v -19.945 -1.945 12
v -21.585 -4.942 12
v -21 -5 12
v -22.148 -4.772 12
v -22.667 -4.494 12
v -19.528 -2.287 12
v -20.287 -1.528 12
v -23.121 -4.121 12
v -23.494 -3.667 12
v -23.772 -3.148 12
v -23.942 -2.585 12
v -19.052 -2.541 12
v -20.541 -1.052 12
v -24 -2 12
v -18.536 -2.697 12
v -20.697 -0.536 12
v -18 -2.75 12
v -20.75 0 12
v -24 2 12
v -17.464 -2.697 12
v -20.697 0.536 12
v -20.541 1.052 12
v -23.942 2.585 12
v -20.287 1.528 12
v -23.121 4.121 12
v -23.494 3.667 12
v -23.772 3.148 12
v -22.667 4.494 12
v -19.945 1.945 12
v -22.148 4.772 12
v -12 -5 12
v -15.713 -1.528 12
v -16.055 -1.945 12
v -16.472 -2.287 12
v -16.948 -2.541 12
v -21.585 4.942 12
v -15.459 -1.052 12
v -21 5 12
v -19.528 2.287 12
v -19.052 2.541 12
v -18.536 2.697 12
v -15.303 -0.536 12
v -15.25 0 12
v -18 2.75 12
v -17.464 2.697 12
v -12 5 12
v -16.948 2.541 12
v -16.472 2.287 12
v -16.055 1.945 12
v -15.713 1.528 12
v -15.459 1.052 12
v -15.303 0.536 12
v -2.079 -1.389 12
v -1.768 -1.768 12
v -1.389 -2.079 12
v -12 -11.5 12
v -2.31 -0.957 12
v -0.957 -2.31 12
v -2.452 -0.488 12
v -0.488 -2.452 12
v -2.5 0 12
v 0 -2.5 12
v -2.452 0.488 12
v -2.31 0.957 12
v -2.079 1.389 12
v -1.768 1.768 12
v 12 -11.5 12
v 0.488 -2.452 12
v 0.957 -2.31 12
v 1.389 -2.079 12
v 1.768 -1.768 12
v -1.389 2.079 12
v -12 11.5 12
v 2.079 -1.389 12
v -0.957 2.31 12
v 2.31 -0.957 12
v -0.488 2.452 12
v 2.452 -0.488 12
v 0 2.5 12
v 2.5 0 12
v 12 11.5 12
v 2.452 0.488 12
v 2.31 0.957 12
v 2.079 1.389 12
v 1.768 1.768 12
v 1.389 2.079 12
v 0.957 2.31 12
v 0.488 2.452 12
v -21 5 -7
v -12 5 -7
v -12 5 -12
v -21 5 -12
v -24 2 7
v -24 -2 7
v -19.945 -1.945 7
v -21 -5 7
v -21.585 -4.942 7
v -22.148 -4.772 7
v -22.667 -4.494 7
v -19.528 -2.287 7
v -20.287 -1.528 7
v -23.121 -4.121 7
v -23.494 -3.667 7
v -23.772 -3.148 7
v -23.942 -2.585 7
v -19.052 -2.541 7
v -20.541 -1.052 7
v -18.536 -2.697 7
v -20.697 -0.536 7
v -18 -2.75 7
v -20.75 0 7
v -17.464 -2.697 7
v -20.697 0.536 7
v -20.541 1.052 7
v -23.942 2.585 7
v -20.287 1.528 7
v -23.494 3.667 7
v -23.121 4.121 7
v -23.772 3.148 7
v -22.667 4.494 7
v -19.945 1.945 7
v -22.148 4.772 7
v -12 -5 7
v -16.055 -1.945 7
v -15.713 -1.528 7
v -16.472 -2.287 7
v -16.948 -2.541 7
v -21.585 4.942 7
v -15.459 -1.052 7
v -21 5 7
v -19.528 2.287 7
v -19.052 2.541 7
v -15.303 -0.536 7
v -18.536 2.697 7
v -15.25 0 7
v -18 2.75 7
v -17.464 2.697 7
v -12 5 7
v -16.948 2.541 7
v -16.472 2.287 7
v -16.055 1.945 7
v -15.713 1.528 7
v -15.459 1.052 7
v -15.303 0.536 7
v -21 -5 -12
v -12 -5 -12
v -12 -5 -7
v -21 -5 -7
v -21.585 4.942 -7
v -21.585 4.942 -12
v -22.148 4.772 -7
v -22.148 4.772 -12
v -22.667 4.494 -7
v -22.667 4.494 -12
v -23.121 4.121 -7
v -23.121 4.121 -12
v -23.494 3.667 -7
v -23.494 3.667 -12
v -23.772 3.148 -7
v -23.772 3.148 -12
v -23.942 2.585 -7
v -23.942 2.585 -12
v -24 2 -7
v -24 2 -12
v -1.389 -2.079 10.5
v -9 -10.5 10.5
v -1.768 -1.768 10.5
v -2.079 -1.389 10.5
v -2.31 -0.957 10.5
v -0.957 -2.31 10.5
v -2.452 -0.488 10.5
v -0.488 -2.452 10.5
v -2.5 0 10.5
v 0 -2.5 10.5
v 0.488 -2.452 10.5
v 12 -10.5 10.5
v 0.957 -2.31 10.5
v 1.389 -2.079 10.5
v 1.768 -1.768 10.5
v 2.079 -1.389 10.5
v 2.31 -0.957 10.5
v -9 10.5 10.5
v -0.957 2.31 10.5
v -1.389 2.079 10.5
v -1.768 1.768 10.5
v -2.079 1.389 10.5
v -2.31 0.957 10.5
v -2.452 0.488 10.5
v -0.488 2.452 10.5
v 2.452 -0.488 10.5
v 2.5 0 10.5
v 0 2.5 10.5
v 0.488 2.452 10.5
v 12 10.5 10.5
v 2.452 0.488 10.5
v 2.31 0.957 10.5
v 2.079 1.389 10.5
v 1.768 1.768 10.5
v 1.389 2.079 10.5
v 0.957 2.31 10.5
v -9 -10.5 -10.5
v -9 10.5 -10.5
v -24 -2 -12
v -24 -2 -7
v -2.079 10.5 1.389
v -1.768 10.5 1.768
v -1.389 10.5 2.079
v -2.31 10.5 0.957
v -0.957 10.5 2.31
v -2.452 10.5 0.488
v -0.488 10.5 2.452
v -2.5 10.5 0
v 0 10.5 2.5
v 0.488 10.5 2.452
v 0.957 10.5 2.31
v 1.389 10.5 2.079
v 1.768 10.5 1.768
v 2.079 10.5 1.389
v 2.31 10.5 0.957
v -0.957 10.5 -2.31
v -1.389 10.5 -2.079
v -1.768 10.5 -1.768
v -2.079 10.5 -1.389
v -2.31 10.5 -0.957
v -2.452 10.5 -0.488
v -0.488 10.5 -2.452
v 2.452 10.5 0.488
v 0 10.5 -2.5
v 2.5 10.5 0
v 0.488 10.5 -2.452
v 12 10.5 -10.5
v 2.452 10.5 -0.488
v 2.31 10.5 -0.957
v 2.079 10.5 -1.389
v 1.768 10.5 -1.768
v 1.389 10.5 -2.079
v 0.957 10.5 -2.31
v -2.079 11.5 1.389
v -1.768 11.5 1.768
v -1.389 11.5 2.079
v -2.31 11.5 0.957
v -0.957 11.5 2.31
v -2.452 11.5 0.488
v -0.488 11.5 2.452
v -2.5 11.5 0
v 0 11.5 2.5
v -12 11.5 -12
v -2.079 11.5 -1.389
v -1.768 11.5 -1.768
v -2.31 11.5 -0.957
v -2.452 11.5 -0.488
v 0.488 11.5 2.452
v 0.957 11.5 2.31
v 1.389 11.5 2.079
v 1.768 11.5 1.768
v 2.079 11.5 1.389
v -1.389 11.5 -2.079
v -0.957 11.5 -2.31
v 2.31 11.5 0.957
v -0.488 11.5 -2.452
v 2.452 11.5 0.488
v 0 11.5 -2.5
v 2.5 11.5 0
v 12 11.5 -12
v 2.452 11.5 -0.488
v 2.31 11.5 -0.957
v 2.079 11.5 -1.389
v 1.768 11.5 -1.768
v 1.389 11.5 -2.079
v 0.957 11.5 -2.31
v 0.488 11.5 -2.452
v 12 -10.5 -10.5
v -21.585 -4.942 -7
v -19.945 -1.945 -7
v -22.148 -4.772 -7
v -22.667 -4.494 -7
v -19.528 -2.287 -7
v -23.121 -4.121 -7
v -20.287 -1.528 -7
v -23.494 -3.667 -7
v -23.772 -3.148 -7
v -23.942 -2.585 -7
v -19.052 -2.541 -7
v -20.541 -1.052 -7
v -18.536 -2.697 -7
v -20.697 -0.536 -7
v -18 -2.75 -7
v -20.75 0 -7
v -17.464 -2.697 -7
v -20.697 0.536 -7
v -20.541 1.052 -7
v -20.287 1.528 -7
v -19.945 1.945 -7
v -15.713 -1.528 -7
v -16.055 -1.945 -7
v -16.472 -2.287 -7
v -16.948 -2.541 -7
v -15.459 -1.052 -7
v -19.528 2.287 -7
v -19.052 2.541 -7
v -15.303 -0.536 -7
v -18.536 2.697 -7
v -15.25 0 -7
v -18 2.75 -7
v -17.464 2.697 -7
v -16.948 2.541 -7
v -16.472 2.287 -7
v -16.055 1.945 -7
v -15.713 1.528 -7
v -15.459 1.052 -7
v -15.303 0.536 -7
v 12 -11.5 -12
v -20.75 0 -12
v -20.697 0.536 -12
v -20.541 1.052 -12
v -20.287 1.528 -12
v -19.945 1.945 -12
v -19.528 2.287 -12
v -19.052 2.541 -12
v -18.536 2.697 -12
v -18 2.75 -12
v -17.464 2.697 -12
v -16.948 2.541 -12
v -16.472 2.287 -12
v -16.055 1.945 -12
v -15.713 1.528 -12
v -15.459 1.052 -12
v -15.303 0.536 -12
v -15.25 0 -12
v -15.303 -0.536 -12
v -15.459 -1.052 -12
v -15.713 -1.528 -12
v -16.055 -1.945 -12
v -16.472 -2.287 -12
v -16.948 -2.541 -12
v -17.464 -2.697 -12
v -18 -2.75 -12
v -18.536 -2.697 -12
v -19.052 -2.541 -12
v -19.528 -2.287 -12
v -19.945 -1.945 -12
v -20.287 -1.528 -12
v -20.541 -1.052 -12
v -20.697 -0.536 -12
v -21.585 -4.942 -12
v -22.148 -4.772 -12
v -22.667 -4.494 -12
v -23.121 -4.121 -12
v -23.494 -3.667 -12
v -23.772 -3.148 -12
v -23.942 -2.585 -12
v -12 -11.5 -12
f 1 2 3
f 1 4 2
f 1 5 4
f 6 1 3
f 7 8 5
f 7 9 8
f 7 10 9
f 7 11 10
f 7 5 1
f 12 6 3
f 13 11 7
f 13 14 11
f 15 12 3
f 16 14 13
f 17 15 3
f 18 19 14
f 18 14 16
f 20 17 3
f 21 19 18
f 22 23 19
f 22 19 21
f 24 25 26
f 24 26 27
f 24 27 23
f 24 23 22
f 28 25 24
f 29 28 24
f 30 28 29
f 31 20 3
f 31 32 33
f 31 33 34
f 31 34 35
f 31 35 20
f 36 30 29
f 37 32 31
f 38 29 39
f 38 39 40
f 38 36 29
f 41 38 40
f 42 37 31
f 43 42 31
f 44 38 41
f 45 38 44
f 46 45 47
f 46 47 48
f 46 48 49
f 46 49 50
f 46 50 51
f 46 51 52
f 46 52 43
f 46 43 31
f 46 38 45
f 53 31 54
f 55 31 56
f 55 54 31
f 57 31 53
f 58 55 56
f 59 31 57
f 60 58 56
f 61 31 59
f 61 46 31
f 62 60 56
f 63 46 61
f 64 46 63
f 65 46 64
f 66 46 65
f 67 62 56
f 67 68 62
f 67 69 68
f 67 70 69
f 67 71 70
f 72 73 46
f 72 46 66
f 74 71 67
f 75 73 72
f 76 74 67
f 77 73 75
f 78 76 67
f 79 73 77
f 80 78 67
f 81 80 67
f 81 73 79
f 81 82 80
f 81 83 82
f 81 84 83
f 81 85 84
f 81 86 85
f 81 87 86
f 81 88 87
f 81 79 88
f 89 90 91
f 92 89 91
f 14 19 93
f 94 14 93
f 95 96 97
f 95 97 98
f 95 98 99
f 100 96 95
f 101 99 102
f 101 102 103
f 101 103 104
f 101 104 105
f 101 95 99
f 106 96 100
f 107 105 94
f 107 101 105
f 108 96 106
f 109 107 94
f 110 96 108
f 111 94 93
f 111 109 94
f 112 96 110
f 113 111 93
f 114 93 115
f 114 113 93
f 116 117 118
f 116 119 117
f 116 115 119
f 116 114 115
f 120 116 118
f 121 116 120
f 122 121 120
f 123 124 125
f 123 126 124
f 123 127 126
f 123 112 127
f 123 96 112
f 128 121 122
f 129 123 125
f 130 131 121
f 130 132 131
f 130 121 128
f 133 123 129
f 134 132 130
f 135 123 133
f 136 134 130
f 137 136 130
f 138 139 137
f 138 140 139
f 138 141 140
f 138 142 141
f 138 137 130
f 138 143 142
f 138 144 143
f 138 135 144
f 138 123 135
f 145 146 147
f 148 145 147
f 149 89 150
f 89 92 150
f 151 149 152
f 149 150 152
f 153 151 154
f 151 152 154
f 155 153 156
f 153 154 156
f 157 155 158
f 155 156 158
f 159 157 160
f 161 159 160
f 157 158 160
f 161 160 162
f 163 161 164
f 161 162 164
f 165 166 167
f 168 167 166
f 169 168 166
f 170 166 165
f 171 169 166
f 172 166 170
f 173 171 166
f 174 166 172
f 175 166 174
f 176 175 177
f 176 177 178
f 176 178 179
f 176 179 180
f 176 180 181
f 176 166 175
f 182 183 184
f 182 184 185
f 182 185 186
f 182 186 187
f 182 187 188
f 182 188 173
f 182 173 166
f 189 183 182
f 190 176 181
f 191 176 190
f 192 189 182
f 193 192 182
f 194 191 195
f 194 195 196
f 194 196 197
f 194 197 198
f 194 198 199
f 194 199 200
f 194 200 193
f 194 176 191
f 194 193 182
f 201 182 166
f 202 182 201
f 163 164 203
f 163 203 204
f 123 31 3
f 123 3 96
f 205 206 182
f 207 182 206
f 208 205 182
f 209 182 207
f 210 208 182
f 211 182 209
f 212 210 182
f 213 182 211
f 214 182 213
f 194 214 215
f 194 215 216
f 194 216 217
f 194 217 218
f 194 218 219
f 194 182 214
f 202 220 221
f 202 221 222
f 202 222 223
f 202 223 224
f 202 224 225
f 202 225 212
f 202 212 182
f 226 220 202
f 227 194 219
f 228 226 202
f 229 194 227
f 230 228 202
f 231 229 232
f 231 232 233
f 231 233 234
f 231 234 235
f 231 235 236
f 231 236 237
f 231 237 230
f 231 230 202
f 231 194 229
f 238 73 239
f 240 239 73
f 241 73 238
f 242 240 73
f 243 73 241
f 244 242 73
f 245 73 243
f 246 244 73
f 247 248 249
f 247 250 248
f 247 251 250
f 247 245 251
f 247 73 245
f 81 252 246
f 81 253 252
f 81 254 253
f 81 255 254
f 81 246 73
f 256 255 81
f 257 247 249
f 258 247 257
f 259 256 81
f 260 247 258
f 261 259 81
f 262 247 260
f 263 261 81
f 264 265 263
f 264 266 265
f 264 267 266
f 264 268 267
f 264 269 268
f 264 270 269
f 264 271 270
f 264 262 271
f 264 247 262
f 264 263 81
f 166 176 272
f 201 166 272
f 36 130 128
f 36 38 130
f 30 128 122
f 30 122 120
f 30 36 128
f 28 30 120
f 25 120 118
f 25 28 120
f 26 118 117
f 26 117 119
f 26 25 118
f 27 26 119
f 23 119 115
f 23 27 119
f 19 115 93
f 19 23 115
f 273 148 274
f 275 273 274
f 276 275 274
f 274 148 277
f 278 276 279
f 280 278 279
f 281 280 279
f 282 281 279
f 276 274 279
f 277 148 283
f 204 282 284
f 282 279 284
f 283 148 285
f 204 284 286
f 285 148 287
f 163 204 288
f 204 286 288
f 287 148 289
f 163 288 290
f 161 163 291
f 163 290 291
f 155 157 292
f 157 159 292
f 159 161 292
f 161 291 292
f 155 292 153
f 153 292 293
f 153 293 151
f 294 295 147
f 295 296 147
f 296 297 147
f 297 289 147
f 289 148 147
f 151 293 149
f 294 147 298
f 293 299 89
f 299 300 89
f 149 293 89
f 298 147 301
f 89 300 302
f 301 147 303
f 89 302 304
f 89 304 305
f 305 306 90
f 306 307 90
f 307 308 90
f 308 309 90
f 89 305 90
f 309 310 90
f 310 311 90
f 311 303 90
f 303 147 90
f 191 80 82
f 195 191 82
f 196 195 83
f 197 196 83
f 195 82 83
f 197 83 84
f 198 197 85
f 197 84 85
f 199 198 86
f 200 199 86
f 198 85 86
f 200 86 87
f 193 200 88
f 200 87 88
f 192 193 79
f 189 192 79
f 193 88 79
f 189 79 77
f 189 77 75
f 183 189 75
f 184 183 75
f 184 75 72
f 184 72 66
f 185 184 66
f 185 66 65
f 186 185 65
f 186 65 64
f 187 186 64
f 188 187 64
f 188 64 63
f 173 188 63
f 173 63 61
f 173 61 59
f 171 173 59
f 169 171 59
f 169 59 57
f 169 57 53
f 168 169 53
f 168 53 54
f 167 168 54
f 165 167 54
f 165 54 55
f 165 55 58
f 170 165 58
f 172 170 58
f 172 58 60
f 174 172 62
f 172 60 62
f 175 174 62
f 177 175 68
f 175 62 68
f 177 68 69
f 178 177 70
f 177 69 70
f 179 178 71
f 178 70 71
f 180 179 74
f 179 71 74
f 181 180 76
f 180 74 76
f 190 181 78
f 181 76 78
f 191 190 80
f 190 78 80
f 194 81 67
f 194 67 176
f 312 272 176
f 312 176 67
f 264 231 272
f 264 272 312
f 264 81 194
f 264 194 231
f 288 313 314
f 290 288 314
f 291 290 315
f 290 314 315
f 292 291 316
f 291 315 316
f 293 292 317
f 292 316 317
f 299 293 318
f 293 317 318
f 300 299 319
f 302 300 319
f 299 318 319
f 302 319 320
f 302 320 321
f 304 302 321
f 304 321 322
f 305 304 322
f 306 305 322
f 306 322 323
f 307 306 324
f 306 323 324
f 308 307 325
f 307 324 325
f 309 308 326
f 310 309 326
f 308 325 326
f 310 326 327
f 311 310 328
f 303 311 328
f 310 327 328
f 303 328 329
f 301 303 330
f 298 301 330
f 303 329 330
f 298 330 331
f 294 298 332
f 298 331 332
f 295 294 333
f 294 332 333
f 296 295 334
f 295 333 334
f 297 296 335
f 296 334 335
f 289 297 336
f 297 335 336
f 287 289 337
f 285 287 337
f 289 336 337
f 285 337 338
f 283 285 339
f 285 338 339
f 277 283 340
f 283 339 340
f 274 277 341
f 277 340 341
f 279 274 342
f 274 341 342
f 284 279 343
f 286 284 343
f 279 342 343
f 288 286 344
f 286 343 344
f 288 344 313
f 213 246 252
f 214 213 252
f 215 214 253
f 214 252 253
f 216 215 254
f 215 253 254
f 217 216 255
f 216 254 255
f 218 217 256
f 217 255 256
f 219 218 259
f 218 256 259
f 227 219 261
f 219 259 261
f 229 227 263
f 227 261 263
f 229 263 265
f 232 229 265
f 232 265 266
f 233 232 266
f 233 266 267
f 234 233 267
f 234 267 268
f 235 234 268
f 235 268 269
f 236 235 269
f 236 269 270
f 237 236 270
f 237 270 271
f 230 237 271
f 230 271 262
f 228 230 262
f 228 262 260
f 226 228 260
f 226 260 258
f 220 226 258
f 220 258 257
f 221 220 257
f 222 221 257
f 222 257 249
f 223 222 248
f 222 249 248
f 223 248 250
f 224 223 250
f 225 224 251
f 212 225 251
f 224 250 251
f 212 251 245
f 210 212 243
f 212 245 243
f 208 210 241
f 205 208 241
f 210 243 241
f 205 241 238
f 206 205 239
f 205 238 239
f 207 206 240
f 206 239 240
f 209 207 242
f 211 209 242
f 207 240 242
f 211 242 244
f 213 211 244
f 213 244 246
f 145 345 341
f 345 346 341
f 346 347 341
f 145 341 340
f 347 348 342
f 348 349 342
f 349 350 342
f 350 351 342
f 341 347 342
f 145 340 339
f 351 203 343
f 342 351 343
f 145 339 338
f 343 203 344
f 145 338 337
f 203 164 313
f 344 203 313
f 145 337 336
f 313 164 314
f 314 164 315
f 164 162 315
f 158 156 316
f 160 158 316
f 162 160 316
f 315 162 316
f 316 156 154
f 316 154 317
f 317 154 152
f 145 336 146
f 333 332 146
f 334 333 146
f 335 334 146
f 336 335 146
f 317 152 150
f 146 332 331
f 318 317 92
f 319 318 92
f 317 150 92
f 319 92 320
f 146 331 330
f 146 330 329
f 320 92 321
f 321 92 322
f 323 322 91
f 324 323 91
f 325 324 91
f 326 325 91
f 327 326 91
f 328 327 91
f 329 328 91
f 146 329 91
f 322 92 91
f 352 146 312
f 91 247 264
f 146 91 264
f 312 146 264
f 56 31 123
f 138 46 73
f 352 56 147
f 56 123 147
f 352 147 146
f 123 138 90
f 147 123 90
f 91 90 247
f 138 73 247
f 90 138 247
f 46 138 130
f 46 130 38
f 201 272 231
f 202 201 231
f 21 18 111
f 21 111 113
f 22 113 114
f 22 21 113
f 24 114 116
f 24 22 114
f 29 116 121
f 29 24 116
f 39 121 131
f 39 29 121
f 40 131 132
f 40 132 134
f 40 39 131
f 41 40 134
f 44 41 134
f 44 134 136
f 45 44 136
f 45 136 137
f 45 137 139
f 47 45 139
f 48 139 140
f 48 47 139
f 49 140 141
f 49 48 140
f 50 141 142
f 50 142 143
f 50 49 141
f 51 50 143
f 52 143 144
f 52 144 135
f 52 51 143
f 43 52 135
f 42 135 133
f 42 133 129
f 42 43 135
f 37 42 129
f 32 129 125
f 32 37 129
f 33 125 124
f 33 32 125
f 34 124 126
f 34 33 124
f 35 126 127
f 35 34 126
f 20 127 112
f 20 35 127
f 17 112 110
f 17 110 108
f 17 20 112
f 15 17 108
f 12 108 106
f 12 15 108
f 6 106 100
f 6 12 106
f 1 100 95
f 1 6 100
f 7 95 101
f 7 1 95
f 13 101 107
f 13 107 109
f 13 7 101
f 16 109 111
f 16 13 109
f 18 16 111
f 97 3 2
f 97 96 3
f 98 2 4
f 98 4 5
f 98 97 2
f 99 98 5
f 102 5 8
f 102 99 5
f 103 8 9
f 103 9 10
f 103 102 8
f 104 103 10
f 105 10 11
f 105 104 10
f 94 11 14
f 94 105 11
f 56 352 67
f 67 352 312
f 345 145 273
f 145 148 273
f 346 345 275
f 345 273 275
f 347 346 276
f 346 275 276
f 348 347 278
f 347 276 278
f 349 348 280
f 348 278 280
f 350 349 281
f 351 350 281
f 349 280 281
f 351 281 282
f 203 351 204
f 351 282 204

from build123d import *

# Parameters (mm, degrees)
SKETCH1_W            = 24
SKETCH1_H            = 24
BOSS_EXTRUDE1_DEPTH  = 11.5
SKETCH2_W            = 21
SKETCH2_H            = 21
CUT_EXTRUDE1_DEPTH   = 21
SKETCH3_R            = 2.5
CUT_EXTRUDE2_DEPTH   = 3
SKETCH4_R            = 2.5
CUT_EXTRUDE3_DEPTH   = 3
BOSS_EXTRUDE3_DEPTH  = 12
SKETCH9_R            = 2.75
CUT_EXTRUDE5_DEPTH   = 5
FILLET2_R            = 3
FILLET2_OF_MIRROR1_R = 3


with BuildPart() as part:
    # Sketch1 → Boss-Extrude1 (new, symmetric)
    with BuildSketch(Plane(origin=(0, 0, 0), x_dir=(1, 0, 0), z_dir=(0, 1, 0))):
        Rectangle(SKETCH1_W, SKETCH1_H)
    extrude(amount=BOSS_EXTRUDE1_DEPTH, both=True)

    # Sketch2 → Cut-Extrude1 (cut)
    with BuildSketch(Plane(origin=(12, 0, 0), x_dir=(0, 0, -1), z_dir=(1, 0, 0))):
        Rectangle(SKETCH2_W, SKETCH2_H)
    extrude(amount=-CUT_EXTRUDE1_DEPTH, mode=Mode.SUBTRACT)

    # Sketch3 → Cut-Extrude2 (cut)
    with BuildSketch(Plane(origin=(0, 11.5, 0), x_dir=(1, 0, 0), z_dir=(0, 1, 0))):
        with Locations(Location((0, 0, 0), (0, 0, 270))):
            Circle(SKETCH3_R)
    extrude(amount=-CUT_EXTRUDE2_DEPTH, mode=Mode.SUBTRACT)

    # Sketch4 → Cut-Extrude3 (cut)
    with BuildSketch(Plane.XY.offset(12)):
        Circle(SKETCH4_R)
    extrude(amount=-CUT_EXTRUDE3_DEPTH, mode=Mode.SUBTRACT)

    # Sketch8 → Boss-Extrude3 (add)
    with BuildSketch(Plane.ZY.offset(12)):
        Polygon((-7, 0), (-7, 5), (-12, 5), (-12, 0), (-12, -5), (-7, -5), align=None)
    boss_extrude3 = extrude(amount=BOSS_EXTRUDE3_DEPTH)

    # Sketch9 → Cut-Extrude5 (cut)
    with BuildSketch(Plane(origin=(0, 0, -12), x_dir=(-1, 0, 0), z_dir=(0, 0, -1))):
        with Locations((18, 0)):
            Circle(SKETCH9_R)
    cut_extrude5 = extrude(amount=-CUT_EXTRUDE5_DEPTH, mode=Mode.SUBTRACT)

    # Fillet2
    fillet2_edges = [part.edges().sort_by_distance(p)[0] for p in [
        (-24, 5, -9.5),
        (-24, -5, -9.5),
    ]]
    fillet(fillet2_edges, radius=FILLET2_R)

    # Mirror1: Boss-Extrude3, Cut-Extrude5 across plane
    add(boss_extrude3.mirror(Plane.XY))
    add(cut_extrude5.mirror(Plane.XY), mode=Mode.SUBTRACT)

    # Fillet2 of Mirror1
    fillet2_of_mirror1_edges = [part.edges().sort_by_distance(p)[0] for p in [
        (-24, 5, 9.5),
        (-24, -5, 9.5),
    ]]
    fillet(fillet2_of_mirror1_edges, radius=FILLET2_OF_MIRROR1_R)


solid = part.part
